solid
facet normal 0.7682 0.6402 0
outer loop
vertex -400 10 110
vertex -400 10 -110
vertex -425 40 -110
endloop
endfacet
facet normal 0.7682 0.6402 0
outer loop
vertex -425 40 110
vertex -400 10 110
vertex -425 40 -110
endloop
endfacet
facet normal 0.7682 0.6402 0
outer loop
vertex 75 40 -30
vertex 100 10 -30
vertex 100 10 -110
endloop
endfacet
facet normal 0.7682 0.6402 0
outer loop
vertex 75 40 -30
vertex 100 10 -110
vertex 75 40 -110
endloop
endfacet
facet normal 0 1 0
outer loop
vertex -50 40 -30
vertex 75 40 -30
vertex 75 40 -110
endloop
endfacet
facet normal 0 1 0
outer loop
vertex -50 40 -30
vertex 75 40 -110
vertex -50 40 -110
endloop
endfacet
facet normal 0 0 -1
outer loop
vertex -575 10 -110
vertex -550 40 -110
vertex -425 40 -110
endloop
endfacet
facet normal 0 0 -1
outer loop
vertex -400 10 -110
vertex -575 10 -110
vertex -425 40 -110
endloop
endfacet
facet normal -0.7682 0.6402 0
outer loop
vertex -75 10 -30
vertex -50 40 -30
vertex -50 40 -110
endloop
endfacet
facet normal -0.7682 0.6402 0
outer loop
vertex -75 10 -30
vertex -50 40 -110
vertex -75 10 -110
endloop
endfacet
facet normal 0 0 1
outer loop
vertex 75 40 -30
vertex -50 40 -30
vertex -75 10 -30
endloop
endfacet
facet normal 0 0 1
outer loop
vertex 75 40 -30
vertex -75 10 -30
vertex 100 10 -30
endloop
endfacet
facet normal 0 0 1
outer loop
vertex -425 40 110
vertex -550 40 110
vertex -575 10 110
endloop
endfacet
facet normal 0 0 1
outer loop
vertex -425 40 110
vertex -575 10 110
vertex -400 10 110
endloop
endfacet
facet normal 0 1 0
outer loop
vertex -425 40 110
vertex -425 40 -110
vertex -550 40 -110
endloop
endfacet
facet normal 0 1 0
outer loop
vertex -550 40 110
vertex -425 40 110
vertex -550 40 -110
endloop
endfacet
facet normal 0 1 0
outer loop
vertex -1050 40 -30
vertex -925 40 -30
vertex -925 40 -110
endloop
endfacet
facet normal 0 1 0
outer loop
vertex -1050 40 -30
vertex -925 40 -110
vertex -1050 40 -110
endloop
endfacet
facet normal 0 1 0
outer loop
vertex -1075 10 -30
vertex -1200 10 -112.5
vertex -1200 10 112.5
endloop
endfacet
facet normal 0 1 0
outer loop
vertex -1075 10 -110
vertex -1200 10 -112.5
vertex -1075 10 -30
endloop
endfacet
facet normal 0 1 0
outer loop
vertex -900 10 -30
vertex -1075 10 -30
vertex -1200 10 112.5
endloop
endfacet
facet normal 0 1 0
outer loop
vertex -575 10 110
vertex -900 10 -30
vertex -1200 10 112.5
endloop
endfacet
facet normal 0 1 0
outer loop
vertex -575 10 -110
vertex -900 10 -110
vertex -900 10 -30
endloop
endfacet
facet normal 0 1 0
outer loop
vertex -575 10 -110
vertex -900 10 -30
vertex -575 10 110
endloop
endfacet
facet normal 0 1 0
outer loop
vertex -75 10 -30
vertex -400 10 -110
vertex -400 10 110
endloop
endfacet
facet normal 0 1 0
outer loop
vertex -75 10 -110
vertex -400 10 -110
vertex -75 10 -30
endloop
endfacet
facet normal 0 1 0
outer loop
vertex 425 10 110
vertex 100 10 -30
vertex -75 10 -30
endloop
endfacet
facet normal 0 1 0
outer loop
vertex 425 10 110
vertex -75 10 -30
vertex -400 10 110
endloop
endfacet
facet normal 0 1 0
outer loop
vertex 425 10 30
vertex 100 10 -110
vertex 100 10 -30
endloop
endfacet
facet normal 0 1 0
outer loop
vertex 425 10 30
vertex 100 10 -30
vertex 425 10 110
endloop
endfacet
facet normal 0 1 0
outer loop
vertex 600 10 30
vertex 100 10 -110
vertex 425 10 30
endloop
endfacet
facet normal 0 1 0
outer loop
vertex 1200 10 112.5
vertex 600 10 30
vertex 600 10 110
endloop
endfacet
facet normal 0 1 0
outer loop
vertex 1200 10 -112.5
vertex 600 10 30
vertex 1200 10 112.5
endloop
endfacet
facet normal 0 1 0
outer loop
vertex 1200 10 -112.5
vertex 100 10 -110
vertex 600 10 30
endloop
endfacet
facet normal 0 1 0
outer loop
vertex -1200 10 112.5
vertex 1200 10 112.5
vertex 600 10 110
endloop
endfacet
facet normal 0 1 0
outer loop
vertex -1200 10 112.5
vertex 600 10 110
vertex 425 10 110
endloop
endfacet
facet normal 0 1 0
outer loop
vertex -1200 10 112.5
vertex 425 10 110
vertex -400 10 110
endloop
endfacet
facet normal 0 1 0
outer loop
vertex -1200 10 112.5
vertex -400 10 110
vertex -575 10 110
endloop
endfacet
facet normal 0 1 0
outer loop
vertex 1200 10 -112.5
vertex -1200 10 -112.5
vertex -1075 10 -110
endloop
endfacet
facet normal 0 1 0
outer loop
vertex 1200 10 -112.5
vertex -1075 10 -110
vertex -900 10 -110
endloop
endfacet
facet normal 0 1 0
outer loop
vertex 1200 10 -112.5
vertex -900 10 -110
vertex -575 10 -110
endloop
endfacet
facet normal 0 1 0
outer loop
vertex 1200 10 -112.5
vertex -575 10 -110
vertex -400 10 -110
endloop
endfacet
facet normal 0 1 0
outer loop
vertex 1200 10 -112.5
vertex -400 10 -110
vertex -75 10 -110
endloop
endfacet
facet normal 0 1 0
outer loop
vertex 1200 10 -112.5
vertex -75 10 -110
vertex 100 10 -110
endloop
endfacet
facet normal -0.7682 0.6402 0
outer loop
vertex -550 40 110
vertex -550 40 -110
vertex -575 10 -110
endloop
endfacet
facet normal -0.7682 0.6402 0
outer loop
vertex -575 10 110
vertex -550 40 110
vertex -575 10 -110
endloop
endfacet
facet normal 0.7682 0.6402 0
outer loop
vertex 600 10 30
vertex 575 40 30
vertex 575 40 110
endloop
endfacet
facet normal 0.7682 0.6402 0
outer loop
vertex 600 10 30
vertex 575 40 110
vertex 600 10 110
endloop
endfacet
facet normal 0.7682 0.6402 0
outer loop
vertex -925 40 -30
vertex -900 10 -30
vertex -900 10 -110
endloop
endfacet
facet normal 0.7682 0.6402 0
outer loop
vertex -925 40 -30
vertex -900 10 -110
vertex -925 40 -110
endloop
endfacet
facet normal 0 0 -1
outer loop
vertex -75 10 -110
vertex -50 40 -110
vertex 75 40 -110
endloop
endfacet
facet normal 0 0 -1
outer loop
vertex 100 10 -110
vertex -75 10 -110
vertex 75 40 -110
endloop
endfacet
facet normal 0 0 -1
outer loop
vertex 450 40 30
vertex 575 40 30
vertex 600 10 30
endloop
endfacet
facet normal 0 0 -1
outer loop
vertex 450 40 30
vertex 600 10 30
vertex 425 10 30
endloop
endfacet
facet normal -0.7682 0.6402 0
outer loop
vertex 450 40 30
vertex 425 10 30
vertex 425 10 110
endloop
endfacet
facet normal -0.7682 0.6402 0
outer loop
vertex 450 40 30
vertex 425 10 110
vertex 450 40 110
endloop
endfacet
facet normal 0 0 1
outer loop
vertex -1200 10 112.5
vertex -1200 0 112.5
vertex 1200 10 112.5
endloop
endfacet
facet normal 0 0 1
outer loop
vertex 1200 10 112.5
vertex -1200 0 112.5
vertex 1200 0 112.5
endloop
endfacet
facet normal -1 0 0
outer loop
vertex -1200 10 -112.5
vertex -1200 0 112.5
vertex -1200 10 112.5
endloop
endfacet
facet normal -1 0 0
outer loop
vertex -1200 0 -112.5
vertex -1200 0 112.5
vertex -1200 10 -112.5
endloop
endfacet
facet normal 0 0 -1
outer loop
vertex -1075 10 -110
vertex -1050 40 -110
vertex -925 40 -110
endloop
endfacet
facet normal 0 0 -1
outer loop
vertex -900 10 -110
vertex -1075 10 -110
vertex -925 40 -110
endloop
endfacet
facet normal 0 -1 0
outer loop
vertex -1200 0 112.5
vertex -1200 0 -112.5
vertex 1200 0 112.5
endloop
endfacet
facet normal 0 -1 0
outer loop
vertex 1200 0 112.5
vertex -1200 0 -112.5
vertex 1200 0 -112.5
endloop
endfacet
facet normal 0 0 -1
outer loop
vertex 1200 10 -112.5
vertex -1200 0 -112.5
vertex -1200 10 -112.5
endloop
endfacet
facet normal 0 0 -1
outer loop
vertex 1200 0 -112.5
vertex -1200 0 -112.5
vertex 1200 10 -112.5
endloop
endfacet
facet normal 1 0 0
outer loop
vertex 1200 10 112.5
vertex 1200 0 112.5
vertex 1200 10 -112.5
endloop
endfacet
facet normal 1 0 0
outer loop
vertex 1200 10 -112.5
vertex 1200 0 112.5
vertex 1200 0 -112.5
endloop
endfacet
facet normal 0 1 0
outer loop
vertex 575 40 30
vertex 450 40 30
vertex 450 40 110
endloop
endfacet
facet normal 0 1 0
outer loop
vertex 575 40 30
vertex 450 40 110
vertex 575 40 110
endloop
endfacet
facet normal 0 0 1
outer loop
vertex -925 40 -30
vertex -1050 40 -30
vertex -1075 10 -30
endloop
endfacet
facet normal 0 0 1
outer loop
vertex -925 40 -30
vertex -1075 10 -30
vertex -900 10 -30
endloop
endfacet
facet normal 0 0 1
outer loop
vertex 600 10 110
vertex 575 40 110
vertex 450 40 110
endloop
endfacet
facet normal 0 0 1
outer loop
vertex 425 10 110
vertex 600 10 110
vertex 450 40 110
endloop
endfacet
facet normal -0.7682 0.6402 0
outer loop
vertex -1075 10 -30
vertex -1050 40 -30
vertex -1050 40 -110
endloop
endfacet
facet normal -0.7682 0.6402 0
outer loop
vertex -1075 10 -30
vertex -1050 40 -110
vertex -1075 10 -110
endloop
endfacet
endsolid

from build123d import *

# Parameters (mm, degrees)
SKETCH1_W                = 2400
SKETCH1_H                = 225
BOSS_EXTRUDE1_DEPTH      = 10
BOSS_EXTRUDE2_START      = 30
BOSS_EXTRUDE2_DEPTH      = 80
BOSS_EXTRUDE3_START      = -30
BOSS_EXTRUDE3_DEPTH      = 80
BOSS_EXTRUDE4_DEPTH      = 110
BOSS_EXTRUDE4_DEPTH_BACK = 110
BOSS_EXTRUDE5_START      = -30
BOSS_EXTRUDE5_DEPTH      = 80


with BuildPart() as part:
    # Sketch1 → Boss-Extrude1 (new body)
    with BuildSketch(Plane(origin=(0, 0, 0), x_dir=(1, 0, 0), z_dir=(0, 1, 0))):
        Rectangle(SKETCH1_W, SKETCH1_H)
    extrude(amount=BOSS_EXTRUDE1_DEPTH)

    # Sketch2 → Boss-Extrude2 (add)
    with BuildSketch(Plane.XY.offset(BOSS_EXTRUDE2_START)):
        Polygon((425, 10), (450, 40), (575, 40), (600, 10), align=None)
    extrude(amount=BOSS_EXTRUDE2_DEPTH)

    # Sketch3 → Boss-Extrude3 (add)
    with BuildSketch(Plane.XY.offset(BOSS_EXTRUDE3_START)):
        Polygon((-50, 40), (-75, 10), (100, 10), (75, 40), align=None)
    extrude(amount=-BOSS_EXTRUDE3_DEPTH)

    # Sketch4 → Boss-Extrude4 (add, two sides: drawn at the far end of the back side and taken through both)
    with BuildSketch(Plane.XY.offset(-BOSS_EXTRUDE4_DEPTH_BACK)):
        Polygon((-550, 40), (-575, 10), (-400, 10), (-425, 40), align=None)
    extrude(amount=BOSS_EXTRUDE4_DEPTH + BOSS_EXTRUDE4_DEPTH_BACK)

    # Sketch5 → Boss-Extrude5 (add)
    with BuildSketch(Plane.XY.offset(BOSS_EXTRUDE5_START)):
        Polygon((-1050, 40), (-1075, 10), (-900, 10), (-925, 40), align=None)
    extrude(amount=-BOSS_EXTRUDE5_DEPTH)


solid = part.part
